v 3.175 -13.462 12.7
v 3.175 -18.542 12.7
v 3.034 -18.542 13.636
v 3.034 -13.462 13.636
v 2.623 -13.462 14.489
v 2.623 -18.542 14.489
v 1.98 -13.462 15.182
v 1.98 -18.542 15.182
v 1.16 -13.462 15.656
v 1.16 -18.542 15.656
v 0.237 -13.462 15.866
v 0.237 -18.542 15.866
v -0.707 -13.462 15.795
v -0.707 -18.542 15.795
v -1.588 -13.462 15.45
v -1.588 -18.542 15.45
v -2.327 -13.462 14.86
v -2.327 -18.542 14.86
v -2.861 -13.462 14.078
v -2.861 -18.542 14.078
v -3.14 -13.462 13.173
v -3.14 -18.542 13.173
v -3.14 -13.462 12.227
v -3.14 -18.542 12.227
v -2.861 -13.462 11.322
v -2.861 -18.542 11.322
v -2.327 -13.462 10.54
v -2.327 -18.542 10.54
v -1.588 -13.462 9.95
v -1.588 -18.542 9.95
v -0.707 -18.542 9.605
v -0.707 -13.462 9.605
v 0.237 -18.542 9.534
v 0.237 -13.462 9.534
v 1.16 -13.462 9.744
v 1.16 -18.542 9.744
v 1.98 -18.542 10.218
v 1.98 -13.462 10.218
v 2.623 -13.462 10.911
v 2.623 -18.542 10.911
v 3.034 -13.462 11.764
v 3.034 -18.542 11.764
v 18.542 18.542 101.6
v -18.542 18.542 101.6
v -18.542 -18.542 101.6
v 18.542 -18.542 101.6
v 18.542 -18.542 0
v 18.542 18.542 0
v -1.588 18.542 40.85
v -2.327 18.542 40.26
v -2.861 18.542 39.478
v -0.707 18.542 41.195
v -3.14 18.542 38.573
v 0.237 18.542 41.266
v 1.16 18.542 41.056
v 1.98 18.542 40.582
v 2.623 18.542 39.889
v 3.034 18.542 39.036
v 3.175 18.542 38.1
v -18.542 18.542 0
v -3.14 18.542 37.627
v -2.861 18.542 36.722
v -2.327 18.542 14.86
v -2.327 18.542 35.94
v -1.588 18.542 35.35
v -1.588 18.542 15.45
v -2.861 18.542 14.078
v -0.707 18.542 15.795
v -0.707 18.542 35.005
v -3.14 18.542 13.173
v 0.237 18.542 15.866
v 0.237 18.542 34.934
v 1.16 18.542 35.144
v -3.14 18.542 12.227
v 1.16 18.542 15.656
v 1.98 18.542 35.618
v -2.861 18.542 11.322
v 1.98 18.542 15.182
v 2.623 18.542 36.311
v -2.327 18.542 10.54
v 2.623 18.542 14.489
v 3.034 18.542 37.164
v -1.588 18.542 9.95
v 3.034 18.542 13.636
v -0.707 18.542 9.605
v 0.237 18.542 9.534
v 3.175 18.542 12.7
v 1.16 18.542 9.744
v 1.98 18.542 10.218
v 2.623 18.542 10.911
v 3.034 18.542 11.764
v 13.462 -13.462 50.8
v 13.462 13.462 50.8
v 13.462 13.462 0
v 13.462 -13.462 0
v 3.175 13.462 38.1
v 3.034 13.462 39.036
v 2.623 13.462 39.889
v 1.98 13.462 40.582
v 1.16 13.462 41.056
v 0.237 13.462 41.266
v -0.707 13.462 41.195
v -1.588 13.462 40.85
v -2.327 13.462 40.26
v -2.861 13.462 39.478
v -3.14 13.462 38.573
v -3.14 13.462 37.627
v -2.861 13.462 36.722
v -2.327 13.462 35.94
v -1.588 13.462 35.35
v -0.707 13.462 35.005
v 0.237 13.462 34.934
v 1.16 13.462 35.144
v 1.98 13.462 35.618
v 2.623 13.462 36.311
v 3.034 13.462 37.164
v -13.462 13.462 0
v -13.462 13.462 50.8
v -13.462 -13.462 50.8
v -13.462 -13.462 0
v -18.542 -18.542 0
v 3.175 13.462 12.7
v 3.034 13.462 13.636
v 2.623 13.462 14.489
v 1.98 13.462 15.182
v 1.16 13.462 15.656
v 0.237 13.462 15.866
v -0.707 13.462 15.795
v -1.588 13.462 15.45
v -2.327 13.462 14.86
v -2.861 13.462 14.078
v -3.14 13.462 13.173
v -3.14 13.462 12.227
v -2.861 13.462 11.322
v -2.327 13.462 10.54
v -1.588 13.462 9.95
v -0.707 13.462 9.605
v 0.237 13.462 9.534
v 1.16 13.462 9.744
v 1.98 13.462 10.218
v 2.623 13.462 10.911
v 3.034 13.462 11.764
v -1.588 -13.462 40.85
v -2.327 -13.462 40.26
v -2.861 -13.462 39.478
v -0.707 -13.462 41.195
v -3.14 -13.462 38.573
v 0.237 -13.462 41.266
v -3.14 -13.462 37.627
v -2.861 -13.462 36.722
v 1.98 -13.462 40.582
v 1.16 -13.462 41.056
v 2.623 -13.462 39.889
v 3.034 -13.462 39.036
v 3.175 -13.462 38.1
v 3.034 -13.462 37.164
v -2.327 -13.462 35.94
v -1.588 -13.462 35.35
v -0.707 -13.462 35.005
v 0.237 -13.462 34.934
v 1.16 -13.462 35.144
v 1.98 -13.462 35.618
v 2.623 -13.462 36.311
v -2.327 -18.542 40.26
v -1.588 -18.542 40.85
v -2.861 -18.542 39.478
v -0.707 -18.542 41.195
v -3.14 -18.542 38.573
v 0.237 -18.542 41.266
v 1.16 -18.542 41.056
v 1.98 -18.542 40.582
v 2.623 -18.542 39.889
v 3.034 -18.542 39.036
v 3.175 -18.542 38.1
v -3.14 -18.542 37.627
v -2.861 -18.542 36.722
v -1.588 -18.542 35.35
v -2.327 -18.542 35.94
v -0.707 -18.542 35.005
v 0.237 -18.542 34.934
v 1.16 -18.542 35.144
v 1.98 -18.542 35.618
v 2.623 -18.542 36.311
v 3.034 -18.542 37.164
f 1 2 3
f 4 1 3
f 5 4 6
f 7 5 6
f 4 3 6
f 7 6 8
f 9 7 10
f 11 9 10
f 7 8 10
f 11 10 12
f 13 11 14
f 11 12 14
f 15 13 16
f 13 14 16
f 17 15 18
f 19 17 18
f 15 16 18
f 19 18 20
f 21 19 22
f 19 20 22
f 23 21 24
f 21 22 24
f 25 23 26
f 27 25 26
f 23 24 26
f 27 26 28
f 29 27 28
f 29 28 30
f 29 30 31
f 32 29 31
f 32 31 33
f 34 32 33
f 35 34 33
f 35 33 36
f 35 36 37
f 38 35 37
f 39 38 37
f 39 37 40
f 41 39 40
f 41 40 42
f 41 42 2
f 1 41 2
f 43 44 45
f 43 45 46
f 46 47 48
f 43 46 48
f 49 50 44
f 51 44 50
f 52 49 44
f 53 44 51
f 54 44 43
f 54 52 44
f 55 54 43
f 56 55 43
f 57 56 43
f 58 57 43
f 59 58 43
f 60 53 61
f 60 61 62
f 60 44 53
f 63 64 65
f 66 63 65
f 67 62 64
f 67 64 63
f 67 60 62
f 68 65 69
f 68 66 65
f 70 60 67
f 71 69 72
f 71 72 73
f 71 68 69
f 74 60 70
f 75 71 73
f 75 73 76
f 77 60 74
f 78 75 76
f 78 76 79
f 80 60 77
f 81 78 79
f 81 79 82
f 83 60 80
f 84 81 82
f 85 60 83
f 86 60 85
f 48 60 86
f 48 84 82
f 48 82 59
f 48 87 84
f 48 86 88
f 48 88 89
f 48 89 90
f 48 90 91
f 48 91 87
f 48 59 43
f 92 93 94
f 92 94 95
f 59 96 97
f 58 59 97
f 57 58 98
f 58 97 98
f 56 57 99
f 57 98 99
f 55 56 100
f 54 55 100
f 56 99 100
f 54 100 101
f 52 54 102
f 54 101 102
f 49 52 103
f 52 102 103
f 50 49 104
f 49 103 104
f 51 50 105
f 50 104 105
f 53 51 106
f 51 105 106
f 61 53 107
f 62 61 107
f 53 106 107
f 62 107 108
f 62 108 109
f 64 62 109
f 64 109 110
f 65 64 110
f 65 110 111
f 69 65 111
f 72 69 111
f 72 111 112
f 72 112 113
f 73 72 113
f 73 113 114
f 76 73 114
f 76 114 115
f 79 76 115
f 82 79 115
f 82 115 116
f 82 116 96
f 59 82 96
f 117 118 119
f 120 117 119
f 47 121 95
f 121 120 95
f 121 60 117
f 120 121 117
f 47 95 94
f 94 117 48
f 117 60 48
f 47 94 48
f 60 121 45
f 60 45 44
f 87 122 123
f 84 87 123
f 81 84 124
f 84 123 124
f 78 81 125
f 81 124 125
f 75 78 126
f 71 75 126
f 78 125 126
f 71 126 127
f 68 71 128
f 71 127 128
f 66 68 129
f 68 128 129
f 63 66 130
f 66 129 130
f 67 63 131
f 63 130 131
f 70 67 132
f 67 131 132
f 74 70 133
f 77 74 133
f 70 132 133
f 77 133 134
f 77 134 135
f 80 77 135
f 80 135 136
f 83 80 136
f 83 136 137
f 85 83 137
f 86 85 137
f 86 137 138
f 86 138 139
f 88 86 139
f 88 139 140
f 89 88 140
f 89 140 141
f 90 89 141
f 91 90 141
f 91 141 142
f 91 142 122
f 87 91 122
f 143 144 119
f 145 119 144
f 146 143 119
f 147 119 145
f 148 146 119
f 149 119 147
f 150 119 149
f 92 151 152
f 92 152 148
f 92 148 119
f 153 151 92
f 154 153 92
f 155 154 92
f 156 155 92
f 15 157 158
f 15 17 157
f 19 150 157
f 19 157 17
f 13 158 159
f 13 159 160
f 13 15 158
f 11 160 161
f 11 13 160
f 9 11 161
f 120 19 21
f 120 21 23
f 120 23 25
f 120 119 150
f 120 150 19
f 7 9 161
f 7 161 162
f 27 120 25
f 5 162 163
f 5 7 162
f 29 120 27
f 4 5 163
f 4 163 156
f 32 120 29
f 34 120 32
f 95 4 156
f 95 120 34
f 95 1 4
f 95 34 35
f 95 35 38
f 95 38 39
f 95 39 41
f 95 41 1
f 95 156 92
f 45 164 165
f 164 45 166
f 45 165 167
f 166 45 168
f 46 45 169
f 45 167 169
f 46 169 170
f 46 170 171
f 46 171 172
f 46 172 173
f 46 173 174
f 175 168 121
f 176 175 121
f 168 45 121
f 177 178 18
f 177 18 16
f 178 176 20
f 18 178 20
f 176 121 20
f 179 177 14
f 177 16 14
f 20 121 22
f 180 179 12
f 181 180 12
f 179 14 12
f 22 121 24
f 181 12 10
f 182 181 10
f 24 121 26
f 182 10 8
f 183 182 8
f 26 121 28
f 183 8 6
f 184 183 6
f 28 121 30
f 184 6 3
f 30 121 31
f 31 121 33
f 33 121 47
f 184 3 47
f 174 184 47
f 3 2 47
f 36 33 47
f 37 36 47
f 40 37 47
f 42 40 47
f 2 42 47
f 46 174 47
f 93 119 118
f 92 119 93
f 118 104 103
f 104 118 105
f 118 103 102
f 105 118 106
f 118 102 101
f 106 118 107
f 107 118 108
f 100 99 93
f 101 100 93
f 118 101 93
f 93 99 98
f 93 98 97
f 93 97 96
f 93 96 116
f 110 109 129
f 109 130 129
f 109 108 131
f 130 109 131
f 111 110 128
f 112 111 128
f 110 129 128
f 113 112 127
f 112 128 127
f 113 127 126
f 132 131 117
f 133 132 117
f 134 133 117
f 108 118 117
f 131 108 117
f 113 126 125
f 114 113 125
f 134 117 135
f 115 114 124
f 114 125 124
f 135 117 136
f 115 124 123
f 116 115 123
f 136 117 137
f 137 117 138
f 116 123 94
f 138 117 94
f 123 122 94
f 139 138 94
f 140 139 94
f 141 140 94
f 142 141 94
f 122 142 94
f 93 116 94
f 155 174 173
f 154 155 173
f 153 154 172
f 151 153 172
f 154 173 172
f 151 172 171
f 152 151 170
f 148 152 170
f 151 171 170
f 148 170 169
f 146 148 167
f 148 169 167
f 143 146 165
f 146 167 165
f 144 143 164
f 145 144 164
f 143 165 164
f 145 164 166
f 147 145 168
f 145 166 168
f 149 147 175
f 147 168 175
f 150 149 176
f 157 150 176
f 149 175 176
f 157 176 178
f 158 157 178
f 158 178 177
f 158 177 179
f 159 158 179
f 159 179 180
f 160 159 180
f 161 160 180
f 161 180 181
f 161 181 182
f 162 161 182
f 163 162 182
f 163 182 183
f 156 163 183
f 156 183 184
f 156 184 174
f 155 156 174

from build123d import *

# Parameters (mm, degrees)
F0_W     = 37.084
F0_H     = 37.084
F1_DEPTH = 101.6
F2_W     = 26.924
F2_H     = 26.924
F3_DEPTH = 50.8
F4_R     = 3.175
F5_DEPTH = 37.085
F6_R     = 3.175
F7_DEPTH = 37.085


with BuildPart() as f1:
    # F0 (on Top) → F1 (new body)
    with BuildSketch(Plane.XY):
        Rectangle(F0_W, F0_H)
    extrude(amount=F1_DEPTH)

    # F2 (on face) → F3 (cut)
    with BuildSketch(Plane(origin=(0, 0, 0), x_dir=(1, 0, 0), z_dir=(0, 0, -1))):
        Rectangle(F2_W, F2_H)
    extrude(amount=-F3_DEPTH, mode=Mode.SUBTRACT)

    # F4 (on face) → F5 (cut, through all)
    with BuildSketch(Plane.XZ.offset(18.542)):
        with Locations((0, 12.7)):
            Circle(F4_R)
    extrude(amount=-F5_DEPTH, mode=Mode.SUBTRACT)

    # F6 (on face) → F7 (cut, through all)
    with BuildSketch(Plane.XZ.offset(18.542)):
        with Locations((0, 38.1)):
            Circle(F6_R)
    extrude(amount=-F7_DEPTH, mode=Mode.SUBTRACT)


solid = f1.part
